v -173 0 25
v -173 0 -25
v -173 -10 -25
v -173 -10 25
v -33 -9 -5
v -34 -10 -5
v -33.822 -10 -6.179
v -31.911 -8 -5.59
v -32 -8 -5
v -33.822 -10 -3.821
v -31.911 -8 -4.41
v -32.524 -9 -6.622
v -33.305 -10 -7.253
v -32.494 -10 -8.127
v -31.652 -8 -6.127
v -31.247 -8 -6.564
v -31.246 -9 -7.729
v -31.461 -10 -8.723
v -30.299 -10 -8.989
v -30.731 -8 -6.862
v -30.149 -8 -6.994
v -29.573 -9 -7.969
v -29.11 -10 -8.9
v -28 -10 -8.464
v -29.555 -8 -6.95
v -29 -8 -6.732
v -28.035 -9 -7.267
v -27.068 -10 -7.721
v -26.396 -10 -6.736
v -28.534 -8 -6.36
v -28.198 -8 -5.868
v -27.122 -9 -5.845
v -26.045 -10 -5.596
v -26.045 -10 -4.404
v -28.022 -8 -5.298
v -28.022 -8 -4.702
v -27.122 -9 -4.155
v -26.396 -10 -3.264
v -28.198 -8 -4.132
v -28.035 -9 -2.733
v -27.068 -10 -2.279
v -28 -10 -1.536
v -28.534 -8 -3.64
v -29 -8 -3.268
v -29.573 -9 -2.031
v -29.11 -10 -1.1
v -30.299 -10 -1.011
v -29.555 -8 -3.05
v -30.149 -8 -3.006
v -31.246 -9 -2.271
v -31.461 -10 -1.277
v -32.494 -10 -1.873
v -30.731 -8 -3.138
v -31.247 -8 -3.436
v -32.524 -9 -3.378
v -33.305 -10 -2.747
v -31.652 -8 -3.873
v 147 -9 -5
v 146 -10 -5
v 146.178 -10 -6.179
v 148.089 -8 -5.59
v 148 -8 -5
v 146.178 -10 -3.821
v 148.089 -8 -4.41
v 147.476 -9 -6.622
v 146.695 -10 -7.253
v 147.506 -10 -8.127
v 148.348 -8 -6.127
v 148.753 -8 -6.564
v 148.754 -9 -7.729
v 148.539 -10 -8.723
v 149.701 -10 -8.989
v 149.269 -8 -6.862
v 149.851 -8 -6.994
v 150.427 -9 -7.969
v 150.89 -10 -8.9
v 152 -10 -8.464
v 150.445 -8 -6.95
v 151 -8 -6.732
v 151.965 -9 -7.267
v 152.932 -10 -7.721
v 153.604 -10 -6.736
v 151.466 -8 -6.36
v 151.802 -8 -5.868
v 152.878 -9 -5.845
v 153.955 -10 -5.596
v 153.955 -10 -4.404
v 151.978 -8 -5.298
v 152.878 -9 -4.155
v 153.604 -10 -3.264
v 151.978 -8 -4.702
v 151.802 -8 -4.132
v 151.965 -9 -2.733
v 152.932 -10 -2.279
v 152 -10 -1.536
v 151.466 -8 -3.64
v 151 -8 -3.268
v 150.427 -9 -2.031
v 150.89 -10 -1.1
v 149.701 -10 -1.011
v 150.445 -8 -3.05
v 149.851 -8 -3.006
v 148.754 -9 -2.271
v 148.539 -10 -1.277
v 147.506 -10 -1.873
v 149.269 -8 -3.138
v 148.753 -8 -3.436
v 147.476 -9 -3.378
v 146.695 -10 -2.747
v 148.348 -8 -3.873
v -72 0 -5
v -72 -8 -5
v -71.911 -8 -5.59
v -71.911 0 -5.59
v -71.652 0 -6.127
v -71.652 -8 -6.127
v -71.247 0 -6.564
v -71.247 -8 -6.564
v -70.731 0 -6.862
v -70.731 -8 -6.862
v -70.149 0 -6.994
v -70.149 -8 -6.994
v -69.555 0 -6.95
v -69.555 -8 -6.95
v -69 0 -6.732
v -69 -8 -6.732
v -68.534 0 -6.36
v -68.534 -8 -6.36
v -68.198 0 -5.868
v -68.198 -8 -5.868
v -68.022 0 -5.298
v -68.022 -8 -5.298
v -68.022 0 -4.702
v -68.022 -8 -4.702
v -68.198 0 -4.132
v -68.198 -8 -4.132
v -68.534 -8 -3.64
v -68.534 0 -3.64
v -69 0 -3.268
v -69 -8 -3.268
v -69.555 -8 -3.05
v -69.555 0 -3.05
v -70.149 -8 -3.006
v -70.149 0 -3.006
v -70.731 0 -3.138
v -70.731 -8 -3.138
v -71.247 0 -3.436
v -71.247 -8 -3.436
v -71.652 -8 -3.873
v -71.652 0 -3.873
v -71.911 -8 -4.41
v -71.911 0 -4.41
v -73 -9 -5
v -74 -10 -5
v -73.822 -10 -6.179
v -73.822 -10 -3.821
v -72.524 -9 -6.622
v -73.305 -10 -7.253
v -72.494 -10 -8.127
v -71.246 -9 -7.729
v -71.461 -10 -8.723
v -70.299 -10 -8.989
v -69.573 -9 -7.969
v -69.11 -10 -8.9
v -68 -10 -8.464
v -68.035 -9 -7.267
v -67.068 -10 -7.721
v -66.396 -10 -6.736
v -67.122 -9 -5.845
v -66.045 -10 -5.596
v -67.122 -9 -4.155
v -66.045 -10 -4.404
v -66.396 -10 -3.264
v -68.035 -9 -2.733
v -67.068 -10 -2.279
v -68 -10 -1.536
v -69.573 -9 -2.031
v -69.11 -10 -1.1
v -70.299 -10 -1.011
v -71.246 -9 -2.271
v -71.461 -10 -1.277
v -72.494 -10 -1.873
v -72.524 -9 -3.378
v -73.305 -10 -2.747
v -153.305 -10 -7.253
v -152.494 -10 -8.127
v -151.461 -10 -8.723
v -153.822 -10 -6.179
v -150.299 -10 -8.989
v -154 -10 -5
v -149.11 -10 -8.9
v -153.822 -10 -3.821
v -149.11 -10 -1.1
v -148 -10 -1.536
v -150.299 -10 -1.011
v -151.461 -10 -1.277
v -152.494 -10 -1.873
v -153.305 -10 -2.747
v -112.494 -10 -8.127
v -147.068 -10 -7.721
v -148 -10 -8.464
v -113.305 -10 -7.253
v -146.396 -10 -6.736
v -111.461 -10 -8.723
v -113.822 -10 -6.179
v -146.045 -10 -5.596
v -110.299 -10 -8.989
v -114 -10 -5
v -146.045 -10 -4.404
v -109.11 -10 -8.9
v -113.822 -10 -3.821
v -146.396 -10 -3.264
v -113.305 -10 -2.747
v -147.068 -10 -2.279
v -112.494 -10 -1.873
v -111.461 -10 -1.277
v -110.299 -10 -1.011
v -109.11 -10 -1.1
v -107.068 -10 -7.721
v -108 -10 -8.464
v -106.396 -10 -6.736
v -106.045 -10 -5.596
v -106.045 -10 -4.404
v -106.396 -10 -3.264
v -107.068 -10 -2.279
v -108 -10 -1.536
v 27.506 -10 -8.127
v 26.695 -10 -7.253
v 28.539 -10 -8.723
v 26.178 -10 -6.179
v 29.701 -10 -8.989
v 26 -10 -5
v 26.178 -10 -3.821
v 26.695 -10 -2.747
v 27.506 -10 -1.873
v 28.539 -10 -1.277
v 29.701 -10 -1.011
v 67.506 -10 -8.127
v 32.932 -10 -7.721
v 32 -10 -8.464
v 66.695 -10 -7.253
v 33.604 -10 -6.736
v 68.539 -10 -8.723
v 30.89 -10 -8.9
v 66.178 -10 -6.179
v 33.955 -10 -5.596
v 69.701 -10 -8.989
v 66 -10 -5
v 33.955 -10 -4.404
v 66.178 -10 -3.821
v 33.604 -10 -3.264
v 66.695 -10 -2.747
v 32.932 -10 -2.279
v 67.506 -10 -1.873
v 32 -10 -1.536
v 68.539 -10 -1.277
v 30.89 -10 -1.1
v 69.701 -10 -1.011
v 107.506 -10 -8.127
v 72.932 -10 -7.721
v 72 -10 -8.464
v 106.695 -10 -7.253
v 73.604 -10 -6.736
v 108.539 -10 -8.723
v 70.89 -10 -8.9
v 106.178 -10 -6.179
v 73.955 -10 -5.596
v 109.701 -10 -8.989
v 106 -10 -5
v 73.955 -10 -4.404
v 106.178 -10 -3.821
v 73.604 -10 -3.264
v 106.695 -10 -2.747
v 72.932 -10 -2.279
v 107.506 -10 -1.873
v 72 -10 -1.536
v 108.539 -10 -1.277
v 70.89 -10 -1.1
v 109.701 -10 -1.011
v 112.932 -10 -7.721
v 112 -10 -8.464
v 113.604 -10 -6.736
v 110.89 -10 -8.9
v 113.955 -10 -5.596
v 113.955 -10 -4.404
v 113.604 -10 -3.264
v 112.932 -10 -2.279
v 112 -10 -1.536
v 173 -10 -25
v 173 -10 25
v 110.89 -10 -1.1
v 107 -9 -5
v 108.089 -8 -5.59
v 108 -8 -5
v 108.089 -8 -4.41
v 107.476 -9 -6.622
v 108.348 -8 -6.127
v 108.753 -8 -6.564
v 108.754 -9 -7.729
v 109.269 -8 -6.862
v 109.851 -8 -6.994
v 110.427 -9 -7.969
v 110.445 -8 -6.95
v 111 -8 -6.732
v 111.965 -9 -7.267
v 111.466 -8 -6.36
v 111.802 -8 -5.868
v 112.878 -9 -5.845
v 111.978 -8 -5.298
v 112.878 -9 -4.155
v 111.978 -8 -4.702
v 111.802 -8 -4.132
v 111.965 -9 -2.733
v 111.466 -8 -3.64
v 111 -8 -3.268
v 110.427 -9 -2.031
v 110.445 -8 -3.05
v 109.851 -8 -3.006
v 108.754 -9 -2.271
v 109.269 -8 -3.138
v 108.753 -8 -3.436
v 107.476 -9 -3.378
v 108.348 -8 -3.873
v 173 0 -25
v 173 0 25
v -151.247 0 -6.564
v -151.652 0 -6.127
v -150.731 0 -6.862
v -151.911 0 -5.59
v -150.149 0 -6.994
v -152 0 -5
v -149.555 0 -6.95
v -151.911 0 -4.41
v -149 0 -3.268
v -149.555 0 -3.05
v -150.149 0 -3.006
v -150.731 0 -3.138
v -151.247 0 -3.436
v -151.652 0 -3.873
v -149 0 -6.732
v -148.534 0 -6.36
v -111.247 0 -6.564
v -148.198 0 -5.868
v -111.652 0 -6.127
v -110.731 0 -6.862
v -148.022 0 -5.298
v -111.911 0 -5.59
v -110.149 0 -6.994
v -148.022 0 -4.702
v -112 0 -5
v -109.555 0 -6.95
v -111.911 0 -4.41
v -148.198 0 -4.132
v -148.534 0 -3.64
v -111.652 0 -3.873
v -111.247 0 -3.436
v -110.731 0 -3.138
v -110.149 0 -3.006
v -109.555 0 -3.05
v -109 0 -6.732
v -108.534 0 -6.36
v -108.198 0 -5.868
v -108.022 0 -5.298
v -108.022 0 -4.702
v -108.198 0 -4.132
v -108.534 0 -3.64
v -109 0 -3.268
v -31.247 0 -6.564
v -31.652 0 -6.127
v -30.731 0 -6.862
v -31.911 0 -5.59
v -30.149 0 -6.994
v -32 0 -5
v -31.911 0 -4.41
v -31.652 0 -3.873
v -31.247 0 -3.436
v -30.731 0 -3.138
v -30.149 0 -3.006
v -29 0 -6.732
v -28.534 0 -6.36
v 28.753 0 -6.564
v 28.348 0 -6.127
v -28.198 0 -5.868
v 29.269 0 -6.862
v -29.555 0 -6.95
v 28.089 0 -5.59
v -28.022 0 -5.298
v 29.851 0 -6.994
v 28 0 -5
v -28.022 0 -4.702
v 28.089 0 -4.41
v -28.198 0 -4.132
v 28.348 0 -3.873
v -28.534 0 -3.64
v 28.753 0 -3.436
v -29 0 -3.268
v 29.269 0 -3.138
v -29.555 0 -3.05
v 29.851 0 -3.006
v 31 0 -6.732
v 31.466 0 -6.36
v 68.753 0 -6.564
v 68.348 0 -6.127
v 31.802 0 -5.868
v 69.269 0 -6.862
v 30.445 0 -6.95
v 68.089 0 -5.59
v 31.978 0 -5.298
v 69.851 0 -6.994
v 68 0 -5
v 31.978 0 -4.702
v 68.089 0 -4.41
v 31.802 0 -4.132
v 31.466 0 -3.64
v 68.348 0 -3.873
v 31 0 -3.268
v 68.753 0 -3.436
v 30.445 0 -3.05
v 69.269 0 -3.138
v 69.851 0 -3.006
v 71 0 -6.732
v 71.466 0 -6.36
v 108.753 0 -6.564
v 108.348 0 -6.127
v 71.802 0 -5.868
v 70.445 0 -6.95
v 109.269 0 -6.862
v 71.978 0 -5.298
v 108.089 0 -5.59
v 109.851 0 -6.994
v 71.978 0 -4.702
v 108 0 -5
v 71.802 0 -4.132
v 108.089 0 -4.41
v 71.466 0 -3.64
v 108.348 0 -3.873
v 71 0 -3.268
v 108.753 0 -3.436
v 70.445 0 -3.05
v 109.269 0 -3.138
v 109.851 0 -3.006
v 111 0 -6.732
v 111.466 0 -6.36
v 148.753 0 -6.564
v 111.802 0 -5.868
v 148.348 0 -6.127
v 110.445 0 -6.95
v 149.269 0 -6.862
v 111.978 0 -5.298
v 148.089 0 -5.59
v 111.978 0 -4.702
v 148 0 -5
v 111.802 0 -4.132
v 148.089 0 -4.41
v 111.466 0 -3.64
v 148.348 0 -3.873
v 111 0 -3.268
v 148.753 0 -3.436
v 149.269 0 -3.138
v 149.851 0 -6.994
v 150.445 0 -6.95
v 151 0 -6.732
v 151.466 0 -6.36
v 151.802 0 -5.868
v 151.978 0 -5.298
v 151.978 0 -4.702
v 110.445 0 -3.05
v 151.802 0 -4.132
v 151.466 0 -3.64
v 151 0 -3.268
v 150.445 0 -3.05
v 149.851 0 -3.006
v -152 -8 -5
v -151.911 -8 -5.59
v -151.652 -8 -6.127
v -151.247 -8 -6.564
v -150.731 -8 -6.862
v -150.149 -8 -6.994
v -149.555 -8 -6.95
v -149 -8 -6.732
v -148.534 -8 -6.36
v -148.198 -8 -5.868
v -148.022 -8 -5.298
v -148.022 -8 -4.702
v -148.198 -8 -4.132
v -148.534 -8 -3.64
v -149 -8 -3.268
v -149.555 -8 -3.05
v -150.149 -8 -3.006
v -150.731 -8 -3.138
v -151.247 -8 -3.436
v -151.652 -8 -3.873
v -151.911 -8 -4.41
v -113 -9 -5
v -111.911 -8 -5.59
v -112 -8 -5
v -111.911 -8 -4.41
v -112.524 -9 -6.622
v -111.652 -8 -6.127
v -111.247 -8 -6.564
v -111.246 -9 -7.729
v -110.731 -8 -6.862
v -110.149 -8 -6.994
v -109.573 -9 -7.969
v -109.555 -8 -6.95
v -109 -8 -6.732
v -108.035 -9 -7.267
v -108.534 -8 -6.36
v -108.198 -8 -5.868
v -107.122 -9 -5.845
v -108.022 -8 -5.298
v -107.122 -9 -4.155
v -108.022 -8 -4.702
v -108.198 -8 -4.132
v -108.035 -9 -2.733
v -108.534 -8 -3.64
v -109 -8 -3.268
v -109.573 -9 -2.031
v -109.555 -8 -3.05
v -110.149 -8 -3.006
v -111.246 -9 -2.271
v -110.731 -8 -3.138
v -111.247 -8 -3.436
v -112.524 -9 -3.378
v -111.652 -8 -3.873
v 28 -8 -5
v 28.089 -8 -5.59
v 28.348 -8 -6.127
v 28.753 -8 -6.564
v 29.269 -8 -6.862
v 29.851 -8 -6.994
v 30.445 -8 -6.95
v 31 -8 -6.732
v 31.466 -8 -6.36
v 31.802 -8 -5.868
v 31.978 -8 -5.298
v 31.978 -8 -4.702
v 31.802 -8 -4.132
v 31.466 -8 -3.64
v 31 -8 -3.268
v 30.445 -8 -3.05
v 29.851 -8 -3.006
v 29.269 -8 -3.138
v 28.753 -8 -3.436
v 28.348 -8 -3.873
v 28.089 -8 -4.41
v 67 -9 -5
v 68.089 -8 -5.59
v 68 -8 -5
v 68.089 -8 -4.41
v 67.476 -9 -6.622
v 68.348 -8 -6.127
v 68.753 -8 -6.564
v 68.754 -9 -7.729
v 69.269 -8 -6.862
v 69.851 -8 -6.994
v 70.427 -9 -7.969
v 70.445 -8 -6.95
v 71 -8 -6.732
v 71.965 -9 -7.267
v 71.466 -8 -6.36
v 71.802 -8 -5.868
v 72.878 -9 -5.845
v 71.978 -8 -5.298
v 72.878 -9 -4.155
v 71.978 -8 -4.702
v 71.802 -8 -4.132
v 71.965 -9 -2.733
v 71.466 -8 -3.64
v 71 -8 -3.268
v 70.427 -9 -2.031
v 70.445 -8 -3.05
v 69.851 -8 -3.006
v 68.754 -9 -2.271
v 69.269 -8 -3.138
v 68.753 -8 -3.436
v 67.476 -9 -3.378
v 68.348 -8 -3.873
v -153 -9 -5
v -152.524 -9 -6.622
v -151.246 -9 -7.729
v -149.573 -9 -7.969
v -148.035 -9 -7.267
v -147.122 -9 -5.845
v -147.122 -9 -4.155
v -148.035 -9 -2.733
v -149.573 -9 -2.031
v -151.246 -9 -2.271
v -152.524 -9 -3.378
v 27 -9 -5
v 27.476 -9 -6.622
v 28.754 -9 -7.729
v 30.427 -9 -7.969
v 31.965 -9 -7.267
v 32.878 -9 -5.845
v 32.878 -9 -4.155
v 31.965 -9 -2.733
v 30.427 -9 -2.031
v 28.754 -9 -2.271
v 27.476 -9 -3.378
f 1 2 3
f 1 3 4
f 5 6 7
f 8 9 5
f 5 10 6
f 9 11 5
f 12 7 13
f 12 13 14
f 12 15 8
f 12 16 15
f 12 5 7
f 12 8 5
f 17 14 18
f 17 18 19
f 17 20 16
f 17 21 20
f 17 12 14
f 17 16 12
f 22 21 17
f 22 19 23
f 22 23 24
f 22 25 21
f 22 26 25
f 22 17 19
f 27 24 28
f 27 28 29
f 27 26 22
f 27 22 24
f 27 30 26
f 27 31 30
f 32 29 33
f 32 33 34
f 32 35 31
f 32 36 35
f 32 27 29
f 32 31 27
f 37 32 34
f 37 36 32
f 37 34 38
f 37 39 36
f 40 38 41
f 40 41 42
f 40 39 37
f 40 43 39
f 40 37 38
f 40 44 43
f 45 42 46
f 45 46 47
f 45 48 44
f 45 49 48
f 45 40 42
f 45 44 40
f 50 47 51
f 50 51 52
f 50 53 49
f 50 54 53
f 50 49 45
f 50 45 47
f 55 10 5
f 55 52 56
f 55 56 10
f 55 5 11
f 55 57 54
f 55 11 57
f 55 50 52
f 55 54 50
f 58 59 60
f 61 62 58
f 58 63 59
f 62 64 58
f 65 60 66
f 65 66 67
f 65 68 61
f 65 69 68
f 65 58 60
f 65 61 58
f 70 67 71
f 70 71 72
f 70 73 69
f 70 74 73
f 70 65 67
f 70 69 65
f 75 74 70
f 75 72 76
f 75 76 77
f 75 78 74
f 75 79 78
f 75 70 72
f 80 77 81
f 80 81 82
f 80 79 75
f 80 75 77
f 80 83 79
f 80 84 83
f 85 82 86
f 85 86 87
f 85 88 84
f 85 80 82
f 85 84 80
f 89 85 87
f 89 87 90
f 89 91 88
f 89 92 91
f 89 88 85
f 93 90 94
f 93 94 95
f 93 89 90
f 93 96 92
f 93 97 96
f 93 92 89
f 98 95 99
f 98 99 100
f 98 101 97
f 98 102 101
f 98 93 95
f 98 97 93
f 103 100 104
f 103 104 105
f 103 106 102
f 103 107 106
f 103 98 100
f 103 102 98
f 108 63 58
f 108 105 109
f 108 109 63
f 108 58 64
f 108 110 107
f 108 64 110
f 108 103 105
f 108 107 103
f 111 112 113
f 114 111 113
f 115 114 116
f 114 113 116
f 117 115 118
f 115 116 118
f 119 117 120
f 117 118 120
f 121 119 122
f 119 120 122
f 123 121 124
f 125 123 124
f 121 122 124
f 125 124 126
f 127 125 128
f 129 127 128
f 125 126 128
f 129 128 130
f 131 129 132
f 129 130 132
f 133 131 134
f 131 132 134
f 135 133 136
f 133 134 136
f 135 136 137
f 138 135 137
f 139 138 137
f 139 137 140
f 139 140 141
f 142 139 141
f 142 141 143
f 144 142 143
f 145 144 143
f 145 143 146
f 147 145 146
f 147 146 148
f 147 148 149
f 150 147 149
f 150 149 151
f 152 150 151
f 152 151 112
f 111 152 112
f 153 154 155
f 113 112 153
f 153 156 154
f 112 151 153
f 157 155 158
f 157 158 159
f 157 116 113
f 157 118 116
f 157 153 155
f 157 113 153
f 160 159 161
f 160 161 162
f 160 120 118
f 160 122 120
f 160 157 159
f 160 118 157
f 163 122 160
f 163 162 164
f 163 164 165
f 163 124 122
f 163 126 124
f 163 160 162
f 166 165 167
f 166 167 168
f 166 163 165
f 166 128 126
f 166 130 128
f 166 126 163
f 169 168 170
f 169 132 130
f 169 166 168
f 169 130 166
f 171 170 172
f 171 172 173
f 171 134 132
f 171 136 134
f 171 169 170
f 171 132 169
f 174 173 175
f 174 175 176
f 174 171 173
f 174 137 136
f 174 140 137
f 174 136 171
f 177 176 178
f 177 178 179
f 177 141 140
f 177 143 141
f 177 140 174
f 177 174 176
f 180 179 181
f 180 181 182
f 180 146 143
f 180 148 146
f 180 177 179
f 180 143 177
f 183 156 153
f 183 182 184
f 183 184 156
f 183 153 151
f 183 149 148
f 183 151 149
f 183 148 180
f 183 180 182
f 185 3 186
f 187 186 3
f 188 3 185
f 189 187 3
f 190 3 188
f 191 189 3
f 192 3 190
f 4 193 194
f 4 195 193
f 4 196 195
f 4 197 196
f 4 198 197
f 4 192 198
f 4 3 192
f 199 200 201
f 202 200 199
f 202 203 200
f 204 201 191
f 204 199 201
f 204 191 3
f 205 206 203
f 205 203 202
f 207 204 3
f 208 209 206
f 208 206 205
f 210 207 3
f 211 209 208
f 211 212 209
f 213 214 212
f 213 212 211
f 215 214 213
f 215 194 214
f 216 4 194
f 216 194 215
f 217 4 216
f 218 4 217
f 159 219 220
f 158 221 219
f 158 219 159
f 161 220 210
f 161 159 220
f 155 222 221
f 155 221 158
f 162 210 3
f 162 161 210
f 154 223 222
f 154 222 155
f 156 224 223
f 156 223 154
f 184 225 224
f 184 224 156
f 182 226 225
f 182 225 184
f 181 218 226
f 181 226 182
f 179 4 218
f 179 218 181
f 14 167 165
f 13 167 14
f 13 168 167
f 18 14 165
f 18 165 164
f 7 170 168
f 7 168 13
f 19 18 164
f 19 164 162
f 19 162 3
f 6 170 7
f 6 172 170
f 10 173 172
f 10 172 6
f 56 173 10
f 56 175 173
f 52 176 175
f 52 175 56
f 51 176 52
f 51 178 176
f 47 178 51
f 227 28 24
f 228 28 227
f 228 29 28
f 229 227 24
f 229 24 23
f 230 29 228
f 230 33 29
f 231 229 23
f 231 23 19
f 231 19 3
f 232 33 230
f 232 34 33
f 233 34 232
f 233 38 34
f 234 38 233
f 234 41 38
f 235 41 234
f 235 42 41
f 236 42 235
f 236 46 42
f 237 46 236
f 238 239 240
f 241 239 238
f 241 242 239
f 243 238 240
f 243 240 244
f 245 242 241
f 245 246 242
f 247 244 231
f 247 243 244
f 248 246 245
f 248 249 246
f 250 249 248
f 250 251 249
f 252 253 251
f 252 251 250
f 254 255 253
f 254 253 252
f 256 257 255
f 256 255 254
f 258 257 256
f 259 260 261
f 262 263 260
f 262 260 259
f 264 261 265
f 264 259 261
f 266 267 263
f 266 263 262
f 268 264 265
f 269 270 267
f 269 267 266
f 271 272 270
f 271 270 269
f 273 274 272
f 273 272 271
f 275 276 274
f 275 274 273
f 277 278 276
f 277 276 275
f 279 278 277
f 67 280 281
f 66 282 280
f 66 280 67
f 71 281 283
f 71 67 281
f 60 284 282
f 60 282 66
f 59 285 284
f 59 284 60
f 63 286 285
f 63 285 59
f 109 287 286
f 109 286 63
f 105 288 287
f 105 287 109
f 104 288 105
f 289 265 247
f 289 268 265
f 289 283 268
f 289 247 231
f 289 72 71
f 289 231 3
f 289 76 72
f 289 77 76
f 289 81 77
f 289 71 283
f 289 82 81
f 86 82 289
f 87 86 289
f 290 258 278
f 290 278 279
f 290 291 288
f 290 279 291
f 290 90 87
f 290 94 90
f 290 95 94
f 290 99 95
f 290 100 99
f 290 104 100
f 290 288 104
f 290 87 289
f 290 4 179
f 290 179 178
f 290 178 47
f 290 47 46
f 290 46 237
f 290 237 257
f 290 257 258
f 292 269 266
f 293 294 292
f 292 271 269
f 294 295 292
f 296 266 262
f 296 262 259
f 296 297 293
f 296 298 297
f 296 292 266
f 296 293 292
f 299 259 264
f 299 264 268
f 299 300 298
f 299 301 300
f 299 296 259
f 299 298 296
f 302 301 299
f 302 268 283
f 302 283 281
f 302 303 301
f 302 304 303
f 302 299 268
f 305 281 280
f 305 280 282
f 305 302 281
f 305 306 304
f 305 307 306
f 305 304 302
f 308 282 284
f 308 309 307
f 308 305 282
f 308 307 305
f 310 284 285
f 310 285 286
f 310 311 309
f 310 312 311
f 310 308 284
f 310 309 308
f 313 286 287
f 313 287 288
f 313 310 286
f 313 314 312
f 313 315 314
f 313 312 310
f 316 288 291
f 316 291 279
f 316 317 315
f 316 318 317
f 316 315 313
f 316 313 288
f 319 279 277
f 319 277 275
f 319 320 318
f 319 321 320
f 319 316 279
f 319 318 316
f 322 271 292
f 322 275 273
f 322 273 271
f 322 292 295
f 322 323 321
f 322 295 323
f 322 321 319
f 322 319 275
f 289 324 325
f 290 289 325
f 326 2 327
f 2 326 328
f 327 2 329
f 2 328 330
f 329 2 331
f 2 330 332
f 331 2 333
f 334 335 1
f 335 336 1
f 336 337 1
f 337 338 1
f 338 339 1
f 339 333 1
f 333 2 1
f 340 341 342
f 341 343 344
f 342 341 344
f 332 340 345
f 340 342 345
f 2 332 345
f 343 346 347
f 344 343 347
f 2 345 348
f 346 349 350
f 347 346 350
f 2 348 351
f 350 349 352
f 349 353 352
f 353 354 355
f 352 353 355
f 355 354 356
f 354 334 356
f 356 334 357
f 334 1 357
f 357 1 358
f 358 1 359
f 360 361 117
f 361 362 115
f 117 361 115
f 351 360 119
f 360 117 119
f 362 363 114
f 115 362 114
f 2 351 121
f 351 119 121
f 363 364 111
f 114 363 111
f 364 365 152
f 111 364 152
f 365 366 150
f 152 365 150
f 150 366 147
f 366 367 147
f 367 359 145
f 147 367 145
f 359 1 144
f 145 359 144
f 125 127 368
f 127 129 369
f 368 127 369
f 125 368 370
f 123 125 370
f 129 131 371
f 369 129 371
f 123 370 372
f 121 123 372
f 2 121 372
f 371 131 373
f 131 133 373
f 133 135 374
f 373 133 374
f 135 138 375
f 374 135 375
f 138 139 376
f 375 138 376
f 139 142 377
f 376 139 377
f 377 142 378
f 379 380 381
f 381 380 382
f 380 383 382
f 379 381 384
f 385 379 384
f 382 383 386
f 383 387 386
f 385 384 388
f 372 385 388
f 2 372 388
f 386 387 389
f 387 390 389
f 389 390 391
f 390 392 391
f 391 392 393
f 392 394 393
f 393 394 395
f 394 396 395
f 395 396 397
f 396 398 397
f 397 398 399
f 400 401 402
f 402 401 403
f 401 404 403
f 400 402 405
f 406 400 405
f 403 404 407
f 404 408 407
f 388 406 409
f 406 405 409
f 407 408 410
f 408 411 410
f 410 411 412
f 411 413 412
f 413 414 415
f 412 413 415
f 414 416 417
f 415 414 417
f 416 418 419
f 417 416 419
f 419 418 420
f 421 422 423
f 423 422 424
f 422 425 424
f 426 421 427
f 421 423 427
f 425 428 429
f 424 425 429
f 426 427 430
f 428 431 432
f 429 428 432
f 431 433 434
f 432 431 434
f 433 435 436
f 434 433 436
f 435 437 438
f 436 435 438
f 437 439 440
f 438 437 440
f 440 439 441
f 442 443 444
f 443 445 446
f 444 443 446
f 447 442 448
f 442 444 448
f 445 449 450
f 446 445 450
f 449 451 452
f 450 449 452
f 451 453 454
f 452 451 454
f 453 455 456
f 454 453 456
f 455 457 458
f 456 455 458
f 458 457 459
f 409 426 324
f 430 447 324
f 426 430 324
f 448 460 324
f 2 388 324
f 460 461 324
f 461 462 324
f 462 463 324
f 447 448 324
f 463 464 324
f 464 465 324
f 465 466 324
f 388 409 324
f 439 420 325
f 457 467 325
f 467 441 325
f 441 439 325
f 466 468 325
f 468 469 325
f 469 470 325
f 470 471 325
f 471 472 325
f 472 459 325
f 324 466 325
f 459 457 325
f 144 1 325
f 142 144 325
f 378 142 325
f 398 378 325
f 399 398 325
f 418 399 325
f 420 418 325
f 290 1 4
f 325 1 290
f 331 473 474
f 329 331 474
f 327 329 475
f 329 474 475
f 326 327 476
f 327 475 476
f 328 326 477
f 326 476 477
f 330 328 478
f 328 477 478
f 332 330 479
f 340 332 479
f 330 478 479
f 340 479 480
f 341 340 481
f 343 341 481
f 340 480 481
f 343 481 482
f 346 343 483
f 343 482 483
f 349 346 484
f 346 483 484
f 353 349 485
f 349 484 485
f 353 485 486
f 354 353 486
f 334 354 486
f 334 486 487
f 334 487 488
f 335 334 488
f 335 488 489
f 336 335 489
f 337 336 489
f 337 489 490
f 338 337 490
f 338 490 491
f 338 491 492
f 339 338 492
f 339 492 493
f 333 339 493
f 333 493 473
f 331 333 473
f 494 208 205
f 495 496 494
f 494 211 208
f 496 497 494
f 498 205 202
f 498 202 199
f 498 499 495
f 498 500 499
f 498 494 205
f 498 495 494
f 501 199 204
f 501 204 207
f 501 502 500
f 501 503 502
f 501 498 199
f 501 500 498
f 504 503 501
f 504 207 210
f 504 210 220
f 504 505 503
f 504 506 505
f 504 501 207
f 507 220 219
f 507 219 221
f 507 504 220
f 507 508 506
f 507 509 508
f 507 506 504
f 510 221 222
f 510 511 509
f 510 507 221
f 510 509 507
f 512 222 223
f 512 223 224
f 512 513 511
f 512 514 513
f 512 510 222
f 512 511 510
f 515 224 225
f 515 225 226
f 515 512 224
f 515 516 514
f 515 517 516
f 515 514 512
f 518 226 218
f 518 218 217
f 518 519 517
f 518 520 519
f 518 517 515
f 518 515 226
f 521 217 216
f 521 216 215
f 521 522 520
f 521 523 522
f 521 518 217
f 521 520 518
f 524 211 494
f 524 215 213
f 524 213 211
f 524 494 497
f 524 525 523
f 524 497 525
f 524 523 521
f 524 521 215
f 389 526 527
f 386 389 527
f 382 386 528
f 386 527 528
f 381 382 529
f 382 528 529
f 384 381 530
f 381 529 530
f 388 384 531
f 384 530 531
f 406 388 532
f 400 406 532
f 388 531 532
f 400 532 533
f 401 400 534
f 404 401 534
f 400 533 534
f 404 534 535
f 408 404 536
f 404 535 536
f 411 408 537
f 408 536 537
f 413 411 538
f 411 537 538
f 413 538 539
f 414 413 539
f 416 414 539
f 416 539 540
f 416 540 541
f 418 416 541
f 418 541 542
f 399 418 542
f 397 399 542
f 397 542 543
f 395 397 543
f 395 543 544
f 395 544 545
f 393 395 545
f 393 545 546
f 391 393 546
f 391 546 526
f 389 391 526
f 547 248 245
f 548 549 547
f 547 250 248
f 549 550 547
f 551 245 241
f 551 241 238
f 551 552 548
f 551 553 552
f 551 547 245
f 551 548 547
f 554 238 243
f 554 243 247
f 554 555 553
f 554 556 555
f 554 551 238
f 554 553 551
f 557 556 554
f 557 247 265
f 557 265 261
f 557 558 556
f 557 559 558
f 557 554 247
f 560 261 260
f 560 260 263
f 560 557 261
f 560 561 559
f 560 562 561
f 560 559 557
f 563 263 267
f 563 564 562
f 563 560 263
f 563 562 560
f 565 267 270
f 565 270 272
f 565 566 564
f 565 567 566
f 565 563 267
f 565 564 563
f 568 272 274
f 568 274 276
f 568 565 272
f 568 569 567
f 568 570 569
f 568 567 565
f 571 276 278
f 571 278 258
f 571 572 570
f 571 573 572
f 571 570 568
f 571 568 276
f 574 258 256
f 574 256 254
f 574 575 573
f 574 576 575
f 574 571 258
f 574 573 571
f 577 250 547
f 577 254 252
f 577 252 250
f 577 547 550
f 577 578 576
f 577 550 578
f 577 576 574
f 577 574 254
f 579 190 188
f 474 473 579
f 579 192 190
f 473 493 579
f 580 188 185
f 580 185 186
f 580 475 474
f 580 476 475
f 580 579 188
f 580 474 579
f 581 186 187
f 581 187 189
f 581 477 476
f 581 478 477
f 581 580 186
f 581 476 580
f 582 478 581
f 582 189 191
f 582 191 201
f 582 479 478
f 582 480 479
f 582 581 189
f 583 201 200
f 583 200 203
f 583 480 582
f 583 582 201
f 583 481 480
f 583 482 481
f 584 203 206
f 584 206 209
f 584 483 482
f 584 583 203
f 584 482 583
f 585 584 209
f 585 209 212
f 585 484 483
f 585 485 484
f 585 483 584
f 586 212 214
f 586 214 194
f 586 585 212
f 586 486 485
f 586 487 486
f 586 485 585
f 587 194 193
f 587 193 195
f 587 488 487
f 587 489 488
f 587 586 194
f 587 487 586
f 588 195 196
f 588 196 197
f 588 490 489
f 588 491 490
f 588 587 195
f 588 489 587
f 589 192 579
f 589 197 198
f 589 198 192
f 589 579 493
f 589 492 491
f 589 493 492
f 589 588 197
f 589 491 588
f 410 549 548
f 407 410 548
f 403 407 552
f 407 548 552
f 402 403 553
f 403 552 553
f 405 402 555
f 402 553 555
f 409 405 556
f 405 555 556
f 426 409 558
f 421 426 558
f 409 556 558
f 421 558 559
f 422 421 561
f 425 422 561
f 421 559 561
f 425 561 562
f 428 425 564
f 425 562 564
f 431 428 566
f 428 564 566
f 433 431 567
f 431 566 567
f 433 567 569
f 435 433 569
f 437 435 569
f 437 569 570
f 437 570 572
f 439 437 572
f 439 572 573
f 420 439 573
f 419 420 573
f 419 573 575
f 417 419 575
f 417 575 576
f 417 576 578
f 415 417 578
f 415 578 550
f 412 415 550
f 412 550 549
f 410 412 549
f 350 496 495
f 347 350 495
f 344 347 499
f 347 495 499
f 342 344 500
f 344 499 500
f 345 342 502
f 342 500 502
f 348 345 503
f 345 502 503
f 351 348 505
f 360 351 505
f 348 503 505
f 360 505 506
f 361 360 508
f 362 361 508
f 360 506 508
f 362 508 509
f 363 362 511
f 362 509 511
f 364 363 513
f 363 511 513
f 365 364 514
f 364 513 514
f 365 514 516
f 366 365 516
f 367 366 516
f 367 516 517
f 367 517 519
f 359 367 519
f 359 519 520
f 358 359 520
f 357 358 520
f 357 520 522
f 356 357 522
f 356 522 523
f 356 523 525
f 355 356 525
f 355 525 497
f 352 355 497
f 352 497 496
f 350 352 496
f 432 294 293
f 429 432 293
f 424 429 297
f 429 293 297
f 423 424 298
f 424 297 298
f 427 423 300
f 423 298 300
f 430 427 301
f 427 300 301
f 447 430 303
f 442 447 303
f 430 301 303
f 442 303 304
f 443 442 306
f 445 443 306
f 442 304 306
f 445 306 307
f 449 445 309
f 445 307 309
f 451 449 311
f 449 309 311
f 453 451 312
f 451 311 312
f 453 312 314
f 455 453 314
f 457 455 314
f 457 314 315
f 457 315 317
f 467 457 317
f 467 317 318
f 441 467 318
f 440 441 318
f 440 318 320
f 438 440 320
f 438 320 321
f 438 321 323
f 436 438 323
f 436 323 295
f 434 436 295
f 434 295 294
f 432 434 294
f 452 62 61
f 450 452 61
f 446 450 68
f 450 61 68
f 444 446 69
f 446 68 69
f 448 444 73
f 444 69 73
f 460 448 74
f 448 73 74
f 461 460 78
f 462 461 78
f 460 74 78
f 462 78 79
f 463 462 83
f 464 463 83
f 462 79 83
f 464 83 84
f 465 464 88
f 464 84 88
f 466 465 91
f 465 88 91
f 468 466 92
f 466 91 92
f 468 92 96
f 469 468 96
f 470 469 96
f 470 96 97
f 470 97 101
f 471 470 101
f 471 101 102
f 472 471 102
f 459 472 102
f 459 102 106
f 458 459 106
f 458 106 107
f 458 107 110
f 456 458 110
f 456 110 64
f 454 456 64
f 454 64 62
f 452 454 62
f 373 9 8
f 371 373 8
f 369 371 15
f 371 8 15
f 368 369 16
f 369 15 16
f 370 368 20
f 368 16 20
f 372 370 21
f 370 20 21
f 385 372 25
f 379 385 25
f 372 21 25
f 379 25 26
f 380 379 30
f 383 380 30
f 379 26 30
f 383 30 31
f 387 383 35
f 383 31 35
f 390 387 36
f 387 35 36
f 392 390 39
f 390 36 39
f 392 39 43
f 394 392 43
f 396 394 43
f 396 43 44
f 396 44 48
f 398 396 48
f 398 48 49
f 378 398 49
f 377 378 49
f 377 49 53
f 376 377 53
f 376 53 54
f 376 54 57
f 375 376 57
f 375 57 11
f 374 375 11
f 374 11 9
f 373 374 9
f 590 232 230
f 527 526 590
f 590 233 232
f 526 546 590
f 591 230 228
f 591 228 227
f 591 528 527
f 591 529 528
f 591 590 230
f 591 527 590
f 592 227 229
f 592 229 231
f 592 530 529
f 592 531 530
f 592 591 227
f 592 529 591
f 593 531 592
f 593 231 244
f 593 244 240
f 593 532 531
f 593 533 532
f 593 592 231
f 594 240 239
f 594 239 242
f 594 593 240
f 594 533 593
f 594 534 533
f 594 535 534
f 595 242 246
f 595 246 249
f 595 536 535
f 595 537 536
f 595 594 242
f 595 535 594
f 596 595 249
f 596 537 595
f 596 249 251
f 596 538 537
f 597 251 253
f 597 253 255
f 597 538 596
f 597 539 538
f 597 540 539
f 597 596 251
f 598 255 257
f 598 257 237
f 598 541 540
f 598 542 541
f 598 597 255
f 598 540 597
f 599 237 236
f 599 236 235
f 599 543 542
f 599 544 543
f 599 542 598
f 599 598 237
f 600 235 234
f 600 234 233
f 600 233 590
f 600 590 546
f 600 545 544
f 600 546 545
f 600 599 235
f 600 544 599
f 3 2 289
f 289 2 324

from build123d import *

# Parameters (mm, degrees)
F0_W     = 346
F0_H     = 50
F1_DEPTH = 10
F3_DEPTH = 10.001
F4_SIZE  = 2


with BuildPart() as f1:
    # F0 (on Front) → F1 (new body)
    with BuildSketch(Plane.XZ):
        Rectangle(F0_W, F0_H)
    extrude(amount=F1_DEPTH)

    # F2 (on face) → F3 (cut, through all)
    with BuildSketch(Plane.XZ.offset(10)):
        with BuildLine():
            ThreePointArc((-148, -5), (-150, -3), (-152, -5))
            Line((-152, -5), (-148, -5))
        make_face()
        with BuildLine():
            Line((-148, -5), (-152, -5))
            ThreePointArc((-152, -5), (-150, -7), (-148, -5))
        make_face()
        with BuildLine():
            ThreePointArc((-108, -5), (-110, -3), (-112, -5))
            Line((-112, -5), (-108, -5))
        make_face()
        with BuildLine():
            Line((-108, -5), (-112, -5))
            ThreePointArc((-112, -5), (-110, -7), (-108, -5))
        make_face()
        with BuildLine():
            ThreePointArc((-68, -5), (-70, -3), (-72, -5))
            Line((-72, -5), (-68, -5))
        make_face()
        with BuildLine():
            Line((-68, -5), (-72, -5))
            ThreePointArc((-72, -5), (-70, -7), (-68, -5))
        make_face()
        with BuildLine():
            Line((-32, -5), (-28, -5))
            ThreePointArc((-28, -5), (-30, -3), (-32, -5))
        make_face()
        with BuildLine():
            ThreePointArc((-32, -5), (-30, -7), (-28, -5))
            Line((-28, -5), (-32, -5))
        make_face()
        with BuildLine():
            ThreePointArc((32, -5), (30, -3), (28, -5))
            Line((28, -5), (32, -5))
        make_face()
        with BuildLine():
            Line((32, -5), (28, -5))
            ThreePointArc((28, -5), (30, -7), (32, -5))
        make_face()
        with BuildLine():
            ThreePointArc((72, -5), (70, -3), (68, -5))
            Line((68, -5), (72, -5))
        make_face()
        with BuildLine():
            Line((72, -5), (68, -5))
            ThreePointArc((68, -5), (70, -7), (72, -5))
        make_face()
        with BuildLine():
            Line((108, -5), (112, -5))
            ThreePointArc((112, -5), (110, -3), (108, -5))
        make_face()
        with BuildLine():
            ThreePointArc((108, -5), (110, -7), (112, -5))
            Line((112, -5), (108, -5))
        make_face()
        with BuildLine():
            Line((148, -5), (152, -5))
            ThreePointArc((152, -5), (150, -3), (148, -5))
        make_face()
        with BuildLine():
            ThreePointArc((148, -5), (150, -7), (152, -5))
            Line((152, -5), (148, -5))
        make_face()
    extrude(amount=-F3_DEPTH, mode=Mode.SUBTRACT)

    # F4
    f4_edges = [f1.edges().sort_by_distance(p)[0] for p in [
        (-148, -10, -5),
        (-108, -10, -5),
        (-68, -10, -5),
        (-28, -10, -5),
        (32, -10, -5),
        (72, -10, -5),
        (112, -10, -5),
        (152, -10, -5),
    ]]
    chamfer(f4_edges, length=F4_SIZE)


solid = f1.part
